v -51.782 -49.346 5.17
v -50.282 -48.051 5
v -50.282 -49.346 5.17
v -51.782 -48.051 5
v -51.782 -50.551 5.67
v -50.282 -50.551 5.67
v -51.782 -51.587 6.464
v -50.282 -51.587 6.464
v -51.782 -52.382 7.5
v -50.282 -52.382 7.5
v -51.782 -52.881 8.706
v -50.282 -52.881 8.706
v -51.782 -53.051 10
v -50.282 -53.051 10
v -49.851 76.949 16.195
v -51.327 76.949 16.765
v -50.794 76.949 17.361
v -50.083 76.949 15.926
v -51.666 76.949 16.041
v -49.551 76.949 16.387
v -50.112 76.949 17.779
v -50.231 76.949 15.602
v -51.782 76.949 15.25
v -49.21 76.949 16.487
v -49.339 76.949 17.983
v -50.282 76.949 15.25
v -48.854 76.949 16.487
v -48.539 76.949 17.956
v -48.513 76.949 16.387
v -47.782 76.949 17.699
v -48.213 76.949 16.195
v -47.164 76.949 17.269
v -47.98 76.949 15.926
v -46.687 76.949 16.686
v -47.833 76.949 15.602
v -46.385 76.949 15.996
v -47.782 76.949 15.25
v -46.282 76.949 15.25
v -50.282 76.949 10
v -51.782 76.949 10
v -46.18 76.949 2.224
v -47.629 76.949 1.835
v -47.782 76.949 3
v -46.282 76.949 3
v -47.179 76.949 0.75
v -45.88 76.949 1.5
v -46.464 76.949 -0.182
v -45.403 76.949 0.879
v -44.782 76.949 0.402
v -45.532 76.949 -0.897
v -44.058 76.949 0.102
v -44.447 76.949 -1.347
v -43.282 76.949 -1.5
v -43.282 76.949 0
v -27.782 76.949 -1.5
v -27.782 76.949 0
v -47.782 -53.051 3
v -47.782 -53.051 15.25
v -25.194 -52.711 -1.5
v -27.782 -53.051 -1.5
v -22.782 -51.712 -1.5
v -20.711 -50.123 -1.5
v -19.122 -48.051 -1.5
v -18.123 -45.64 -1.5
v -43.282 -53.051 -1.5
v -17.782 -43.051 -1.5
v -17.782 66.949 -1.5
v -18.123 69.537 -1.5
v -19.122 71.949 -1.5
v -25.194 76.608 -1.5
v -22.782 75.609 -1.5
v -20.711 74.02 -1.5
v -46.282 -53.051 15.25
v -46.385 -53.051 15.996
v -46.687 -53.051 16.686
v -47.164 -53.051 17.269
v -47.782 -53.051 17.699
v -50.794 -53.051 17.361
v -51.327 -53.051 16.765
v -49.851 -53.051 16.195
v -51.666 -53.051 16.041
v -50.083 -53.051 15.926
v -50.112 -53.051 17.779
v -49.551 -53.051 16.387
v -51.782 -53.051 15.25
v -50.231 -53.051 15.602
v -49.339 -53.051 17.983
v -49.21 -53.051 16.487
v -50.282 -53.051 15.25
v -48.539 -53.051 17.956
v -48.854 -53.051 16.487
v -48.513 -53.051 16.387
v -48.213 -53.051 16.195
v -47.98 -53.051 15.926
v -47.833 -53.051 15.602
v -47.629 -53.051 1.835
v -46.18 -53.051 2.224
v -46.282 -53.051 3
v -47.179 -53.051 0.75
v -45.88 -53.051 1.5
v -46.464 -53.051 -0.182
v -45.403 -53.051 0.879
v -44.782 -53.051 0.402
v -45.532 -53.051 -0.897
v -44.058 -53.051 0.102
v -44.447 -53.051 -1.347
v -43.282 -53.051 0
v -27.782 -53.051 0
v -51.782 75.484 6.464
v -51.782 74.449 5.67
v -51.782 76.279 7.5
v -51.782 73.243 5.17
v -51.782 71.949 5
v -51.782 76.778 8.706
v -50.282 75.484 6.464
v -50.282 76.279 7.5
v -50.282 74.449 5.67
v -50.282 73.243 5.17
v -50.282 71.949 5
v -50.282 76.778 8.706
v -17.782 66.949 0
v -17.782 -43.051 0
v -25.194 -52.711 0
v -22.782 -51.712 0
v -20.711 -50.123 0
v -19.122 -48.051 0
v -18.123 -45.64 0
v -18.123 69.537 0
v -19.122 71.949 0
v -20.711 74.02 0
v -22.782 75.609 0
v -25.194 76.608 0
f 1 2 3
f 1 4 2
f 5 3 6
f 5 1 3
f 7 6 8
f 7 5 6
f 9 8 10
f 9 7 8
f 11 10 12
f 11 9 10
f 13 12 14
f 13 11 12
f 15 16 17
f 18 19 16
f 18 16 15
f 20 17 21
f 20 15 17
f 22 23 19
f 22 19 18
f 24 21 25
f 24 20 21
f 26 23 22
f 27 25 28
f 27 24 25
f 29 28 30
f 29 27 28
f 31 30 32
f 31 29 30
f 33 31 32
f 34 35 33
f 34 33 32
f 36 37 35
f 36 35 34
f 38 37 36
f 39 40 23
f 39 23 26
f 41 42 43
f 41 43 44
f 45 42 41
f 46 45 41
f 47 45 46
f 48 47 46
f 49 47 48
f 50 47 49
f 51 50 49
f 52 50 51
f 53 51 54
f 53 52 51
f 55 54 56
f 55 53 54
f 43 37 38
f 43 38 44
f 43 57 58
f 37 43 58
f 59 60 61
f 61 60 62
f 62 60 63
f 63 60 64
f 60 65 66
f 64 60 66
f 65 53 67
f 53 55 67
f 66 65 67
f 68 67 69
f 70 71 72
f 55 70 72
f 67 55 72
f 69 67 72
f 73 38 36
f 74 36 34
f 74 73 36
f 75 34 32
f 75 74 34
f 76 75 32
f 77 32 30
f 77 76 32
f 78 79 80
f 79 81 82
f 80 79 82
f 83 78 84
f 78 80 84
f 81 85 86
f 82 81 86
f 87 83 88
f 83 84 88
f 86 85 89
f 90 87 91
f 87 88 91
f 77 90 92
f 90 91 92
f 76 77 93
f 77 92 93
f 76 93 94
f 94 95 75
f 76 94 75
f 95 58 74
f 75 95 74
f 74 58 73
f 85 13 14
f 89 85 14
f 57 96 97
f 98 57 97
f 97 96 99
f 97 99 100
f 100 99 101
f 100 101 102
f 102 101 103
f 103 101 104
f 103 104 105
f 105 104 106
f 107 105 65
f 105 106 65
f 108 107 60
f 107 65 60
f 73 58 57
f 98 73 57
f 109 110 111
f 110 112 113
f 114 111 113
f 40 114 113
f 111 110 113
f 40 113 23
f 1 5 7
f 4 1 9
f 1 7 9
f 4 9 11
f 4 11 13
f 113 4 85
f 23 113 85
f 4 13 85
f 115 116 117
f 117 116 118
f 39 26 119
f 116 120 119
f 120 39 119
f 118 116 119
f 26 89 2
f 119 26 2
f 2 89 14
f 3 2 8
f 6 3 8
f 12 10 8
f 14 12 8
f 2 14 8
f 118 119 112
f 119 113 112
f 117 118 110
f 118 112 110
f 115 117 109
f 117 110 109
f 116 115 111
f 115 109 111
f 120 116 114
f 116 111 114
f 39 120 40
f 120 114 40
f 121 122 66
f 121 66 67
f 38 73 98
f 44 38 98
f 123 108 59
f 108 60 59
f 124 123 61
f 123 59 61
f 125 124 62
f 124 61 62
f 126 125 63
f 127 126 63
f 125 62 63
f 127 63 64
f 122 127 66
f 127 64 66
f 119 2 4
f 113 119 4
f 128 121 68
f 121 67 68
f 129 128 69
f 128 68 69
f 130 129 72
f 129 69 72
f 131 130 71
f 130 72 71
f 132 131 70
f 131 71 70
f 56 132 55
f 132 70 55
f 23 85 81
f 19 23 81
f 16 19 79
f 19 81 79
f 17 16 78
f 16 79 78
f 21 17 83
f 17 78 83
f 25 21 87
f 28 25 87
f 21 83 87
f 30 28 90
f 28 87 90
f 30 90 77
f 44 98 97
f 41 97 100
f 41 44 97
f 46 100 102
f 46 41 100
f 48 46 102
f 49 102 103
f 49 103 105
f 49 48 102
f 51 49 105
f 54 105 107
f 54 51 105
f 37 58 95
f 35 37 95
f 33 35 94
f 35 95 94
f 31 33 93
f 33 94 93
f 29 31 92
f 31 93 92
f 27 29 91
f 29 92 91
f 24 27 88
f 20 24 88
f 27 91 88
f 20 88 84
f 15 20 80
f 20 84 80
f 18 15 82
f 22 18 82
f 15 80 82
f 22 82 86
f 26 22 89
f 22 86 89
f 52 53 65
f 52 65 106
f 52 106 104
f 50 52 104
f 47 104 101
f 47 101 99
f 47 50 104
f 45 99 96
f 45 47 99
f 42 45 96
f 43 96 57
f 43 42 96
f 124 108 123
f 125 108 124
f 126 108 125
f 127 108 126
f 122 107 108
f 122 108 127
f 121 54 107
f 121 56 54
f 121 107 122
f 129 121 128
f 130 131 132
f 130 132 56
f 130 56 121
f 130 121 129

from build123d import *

# Parameters (mm, degrees)
IZIM1_W                      = 30
IZIM1_H                      = 130
TABAN_FLAN_1_DEPTH           = 1.5
RADYUS1_R                    = 10
KENAR_FLAN_1_STRIP_W         = 12
KENAR_FLAN_1_STRIP_H         = 1.5
KENAR_FLAN_1_STRIP_CUT_DEPTH = 130
KENAR_FLAN_1_DEPTH           = 130
KENAR_START                  = -53.051470588
KENAR_EKME1_DEPTH            = 130
KENAR_EKME1_2_DEPTH          = 130
RADYUS2_R                    = 5


# Read off the part's stored shape, not the designer's step: Kenar Çekme1
# Sheet-metal steps are written as plain solids
with BuildPart() as part:
    # Çizim1 → Taban-Flanş1 (new body)
    with BuildSketch(Plane.XY):
        with Locations((-32.781930006, 11.948529412)):
            Rectangle(IZIM1_W, IZIM1_H)
    extrude(amount=-TABAN_FLAN_1_DEPTH)

    # Radyus1
    radyus1_edges = [part.edges().sort_by_distance(p)[0] for p in [
        (-17.781930006, 76.948529412, -0.75),
        (-17.781930006, -53.051470588, -0.75),
    ]]
    fillet(radyus1_edges, radius=RADYUS1_R)

    # Kenar-Flanş1 strip (across the edge) → Kenar-Flanş1 strip cut (cut)
    with BuildSketch(Plane(origin=(-47.781930006, 76.948529412, 0), x_dir=(1, 0, 0), z_dir=(0, -1, 0))):
        with Locations((-1.5, -0.75)):
            Rectangle(KENAR_FLAN_1_STRIP_W, KENAR_FLAN_1_STRIP_H)
    extrude(amount=KENAR_FLAN_1_STRIP_CUT_DEPTH, mode=Mode.SUBTRACT)

    # Kenar-Flanş1 section (across the edge) → Kenar-Flanş1 (add)
    with BuildSketch(Plane(origin=(-47.781930006, 76.948529412, 0), x_dir=(1, 0, 0), z_dir=(0, -1, 0))):
        with BuildLine():
            Line((0, 3), (0, 18))
            Line((0, 18), (1.5, 18))
            Line((1.5, 18), (1.5, 3))
            ThreePointArc((1.5, 3), (2.378679656, 0.878679656), (4.5, 0))
            Line((4.5, 0), (4.5, -1.5))
            ThreePointArc((4.5, -1.5), (1.318019485, -0.181980515), (0, 3))
        make_face()
    extrude(amount=KENAR_FLAN_1_DEPTH)

    # Kenar Çekme1 outline → Kenar Çekme1 (cut)
    with BuildSketch(Plane(origin=(0, 0, 0), x_dir=(1, 0, 0), z_dir=(0, 1, 0)).offset(KENAR_START)):
        with BuildLine():
            ThreePointArc((-46.281930006, -15.25), (-46.686722126, -16.686140662), (-47.781930006, -17.699489743))
            Line((-47.781930006, -17.699489743), (-47.781930006, -18))
            Line((-47.781930006, -18), (-46.281930006, -18))
            Line((-46.281930006, -18), (-46.281930006, -15.25))
        make_face()
    extrude(amount=KENAR_EKME1_DEPTH, mode=Mode.SUBTRACT)

    # Kenar _ekme1 2 outline → Kenar _ekme1 2 (add)
    with BuildSketch(Plane(origin=(0, 0, 0), x_dir=(1, 0, 0), z_dir=(0, 1, 0)).offset(KENAR_START)):
        with BuildLine():
            Line((-50.281930006, -5), (-51.781930006, -5))
            Line((-51.781930006, -5), (-51.781930006, -15.25))
            ThreePointArc((-51.781930006, -15.25), (-50.468070668, -17.59520788), (-47.781930006, -17.699489743))
            Line((-47.781930006, -17.699489743), (-47.781930006, -15.25))
            ThreePointArc((-47.781930006, -15.25), (-49.031930006, -16.5), (-50.281930006, -15.25))
            Line((-50.281930006, -15.25), (-50.281930006, -5))
        make_face()
    extrude(amount=KENAR_EKME1_2_DEPTH)

    # Radyus2
    radyus2_edges = [part.edges().sort_by_distance(p)[0] for p in [
        (-51.031930006, 76.948529412, 5),
        (-51.031930006, -53.051470588, 5),
    ]]
    fillet(radyus2_edges, radius=RADYUS2_R)


solid = part.part
